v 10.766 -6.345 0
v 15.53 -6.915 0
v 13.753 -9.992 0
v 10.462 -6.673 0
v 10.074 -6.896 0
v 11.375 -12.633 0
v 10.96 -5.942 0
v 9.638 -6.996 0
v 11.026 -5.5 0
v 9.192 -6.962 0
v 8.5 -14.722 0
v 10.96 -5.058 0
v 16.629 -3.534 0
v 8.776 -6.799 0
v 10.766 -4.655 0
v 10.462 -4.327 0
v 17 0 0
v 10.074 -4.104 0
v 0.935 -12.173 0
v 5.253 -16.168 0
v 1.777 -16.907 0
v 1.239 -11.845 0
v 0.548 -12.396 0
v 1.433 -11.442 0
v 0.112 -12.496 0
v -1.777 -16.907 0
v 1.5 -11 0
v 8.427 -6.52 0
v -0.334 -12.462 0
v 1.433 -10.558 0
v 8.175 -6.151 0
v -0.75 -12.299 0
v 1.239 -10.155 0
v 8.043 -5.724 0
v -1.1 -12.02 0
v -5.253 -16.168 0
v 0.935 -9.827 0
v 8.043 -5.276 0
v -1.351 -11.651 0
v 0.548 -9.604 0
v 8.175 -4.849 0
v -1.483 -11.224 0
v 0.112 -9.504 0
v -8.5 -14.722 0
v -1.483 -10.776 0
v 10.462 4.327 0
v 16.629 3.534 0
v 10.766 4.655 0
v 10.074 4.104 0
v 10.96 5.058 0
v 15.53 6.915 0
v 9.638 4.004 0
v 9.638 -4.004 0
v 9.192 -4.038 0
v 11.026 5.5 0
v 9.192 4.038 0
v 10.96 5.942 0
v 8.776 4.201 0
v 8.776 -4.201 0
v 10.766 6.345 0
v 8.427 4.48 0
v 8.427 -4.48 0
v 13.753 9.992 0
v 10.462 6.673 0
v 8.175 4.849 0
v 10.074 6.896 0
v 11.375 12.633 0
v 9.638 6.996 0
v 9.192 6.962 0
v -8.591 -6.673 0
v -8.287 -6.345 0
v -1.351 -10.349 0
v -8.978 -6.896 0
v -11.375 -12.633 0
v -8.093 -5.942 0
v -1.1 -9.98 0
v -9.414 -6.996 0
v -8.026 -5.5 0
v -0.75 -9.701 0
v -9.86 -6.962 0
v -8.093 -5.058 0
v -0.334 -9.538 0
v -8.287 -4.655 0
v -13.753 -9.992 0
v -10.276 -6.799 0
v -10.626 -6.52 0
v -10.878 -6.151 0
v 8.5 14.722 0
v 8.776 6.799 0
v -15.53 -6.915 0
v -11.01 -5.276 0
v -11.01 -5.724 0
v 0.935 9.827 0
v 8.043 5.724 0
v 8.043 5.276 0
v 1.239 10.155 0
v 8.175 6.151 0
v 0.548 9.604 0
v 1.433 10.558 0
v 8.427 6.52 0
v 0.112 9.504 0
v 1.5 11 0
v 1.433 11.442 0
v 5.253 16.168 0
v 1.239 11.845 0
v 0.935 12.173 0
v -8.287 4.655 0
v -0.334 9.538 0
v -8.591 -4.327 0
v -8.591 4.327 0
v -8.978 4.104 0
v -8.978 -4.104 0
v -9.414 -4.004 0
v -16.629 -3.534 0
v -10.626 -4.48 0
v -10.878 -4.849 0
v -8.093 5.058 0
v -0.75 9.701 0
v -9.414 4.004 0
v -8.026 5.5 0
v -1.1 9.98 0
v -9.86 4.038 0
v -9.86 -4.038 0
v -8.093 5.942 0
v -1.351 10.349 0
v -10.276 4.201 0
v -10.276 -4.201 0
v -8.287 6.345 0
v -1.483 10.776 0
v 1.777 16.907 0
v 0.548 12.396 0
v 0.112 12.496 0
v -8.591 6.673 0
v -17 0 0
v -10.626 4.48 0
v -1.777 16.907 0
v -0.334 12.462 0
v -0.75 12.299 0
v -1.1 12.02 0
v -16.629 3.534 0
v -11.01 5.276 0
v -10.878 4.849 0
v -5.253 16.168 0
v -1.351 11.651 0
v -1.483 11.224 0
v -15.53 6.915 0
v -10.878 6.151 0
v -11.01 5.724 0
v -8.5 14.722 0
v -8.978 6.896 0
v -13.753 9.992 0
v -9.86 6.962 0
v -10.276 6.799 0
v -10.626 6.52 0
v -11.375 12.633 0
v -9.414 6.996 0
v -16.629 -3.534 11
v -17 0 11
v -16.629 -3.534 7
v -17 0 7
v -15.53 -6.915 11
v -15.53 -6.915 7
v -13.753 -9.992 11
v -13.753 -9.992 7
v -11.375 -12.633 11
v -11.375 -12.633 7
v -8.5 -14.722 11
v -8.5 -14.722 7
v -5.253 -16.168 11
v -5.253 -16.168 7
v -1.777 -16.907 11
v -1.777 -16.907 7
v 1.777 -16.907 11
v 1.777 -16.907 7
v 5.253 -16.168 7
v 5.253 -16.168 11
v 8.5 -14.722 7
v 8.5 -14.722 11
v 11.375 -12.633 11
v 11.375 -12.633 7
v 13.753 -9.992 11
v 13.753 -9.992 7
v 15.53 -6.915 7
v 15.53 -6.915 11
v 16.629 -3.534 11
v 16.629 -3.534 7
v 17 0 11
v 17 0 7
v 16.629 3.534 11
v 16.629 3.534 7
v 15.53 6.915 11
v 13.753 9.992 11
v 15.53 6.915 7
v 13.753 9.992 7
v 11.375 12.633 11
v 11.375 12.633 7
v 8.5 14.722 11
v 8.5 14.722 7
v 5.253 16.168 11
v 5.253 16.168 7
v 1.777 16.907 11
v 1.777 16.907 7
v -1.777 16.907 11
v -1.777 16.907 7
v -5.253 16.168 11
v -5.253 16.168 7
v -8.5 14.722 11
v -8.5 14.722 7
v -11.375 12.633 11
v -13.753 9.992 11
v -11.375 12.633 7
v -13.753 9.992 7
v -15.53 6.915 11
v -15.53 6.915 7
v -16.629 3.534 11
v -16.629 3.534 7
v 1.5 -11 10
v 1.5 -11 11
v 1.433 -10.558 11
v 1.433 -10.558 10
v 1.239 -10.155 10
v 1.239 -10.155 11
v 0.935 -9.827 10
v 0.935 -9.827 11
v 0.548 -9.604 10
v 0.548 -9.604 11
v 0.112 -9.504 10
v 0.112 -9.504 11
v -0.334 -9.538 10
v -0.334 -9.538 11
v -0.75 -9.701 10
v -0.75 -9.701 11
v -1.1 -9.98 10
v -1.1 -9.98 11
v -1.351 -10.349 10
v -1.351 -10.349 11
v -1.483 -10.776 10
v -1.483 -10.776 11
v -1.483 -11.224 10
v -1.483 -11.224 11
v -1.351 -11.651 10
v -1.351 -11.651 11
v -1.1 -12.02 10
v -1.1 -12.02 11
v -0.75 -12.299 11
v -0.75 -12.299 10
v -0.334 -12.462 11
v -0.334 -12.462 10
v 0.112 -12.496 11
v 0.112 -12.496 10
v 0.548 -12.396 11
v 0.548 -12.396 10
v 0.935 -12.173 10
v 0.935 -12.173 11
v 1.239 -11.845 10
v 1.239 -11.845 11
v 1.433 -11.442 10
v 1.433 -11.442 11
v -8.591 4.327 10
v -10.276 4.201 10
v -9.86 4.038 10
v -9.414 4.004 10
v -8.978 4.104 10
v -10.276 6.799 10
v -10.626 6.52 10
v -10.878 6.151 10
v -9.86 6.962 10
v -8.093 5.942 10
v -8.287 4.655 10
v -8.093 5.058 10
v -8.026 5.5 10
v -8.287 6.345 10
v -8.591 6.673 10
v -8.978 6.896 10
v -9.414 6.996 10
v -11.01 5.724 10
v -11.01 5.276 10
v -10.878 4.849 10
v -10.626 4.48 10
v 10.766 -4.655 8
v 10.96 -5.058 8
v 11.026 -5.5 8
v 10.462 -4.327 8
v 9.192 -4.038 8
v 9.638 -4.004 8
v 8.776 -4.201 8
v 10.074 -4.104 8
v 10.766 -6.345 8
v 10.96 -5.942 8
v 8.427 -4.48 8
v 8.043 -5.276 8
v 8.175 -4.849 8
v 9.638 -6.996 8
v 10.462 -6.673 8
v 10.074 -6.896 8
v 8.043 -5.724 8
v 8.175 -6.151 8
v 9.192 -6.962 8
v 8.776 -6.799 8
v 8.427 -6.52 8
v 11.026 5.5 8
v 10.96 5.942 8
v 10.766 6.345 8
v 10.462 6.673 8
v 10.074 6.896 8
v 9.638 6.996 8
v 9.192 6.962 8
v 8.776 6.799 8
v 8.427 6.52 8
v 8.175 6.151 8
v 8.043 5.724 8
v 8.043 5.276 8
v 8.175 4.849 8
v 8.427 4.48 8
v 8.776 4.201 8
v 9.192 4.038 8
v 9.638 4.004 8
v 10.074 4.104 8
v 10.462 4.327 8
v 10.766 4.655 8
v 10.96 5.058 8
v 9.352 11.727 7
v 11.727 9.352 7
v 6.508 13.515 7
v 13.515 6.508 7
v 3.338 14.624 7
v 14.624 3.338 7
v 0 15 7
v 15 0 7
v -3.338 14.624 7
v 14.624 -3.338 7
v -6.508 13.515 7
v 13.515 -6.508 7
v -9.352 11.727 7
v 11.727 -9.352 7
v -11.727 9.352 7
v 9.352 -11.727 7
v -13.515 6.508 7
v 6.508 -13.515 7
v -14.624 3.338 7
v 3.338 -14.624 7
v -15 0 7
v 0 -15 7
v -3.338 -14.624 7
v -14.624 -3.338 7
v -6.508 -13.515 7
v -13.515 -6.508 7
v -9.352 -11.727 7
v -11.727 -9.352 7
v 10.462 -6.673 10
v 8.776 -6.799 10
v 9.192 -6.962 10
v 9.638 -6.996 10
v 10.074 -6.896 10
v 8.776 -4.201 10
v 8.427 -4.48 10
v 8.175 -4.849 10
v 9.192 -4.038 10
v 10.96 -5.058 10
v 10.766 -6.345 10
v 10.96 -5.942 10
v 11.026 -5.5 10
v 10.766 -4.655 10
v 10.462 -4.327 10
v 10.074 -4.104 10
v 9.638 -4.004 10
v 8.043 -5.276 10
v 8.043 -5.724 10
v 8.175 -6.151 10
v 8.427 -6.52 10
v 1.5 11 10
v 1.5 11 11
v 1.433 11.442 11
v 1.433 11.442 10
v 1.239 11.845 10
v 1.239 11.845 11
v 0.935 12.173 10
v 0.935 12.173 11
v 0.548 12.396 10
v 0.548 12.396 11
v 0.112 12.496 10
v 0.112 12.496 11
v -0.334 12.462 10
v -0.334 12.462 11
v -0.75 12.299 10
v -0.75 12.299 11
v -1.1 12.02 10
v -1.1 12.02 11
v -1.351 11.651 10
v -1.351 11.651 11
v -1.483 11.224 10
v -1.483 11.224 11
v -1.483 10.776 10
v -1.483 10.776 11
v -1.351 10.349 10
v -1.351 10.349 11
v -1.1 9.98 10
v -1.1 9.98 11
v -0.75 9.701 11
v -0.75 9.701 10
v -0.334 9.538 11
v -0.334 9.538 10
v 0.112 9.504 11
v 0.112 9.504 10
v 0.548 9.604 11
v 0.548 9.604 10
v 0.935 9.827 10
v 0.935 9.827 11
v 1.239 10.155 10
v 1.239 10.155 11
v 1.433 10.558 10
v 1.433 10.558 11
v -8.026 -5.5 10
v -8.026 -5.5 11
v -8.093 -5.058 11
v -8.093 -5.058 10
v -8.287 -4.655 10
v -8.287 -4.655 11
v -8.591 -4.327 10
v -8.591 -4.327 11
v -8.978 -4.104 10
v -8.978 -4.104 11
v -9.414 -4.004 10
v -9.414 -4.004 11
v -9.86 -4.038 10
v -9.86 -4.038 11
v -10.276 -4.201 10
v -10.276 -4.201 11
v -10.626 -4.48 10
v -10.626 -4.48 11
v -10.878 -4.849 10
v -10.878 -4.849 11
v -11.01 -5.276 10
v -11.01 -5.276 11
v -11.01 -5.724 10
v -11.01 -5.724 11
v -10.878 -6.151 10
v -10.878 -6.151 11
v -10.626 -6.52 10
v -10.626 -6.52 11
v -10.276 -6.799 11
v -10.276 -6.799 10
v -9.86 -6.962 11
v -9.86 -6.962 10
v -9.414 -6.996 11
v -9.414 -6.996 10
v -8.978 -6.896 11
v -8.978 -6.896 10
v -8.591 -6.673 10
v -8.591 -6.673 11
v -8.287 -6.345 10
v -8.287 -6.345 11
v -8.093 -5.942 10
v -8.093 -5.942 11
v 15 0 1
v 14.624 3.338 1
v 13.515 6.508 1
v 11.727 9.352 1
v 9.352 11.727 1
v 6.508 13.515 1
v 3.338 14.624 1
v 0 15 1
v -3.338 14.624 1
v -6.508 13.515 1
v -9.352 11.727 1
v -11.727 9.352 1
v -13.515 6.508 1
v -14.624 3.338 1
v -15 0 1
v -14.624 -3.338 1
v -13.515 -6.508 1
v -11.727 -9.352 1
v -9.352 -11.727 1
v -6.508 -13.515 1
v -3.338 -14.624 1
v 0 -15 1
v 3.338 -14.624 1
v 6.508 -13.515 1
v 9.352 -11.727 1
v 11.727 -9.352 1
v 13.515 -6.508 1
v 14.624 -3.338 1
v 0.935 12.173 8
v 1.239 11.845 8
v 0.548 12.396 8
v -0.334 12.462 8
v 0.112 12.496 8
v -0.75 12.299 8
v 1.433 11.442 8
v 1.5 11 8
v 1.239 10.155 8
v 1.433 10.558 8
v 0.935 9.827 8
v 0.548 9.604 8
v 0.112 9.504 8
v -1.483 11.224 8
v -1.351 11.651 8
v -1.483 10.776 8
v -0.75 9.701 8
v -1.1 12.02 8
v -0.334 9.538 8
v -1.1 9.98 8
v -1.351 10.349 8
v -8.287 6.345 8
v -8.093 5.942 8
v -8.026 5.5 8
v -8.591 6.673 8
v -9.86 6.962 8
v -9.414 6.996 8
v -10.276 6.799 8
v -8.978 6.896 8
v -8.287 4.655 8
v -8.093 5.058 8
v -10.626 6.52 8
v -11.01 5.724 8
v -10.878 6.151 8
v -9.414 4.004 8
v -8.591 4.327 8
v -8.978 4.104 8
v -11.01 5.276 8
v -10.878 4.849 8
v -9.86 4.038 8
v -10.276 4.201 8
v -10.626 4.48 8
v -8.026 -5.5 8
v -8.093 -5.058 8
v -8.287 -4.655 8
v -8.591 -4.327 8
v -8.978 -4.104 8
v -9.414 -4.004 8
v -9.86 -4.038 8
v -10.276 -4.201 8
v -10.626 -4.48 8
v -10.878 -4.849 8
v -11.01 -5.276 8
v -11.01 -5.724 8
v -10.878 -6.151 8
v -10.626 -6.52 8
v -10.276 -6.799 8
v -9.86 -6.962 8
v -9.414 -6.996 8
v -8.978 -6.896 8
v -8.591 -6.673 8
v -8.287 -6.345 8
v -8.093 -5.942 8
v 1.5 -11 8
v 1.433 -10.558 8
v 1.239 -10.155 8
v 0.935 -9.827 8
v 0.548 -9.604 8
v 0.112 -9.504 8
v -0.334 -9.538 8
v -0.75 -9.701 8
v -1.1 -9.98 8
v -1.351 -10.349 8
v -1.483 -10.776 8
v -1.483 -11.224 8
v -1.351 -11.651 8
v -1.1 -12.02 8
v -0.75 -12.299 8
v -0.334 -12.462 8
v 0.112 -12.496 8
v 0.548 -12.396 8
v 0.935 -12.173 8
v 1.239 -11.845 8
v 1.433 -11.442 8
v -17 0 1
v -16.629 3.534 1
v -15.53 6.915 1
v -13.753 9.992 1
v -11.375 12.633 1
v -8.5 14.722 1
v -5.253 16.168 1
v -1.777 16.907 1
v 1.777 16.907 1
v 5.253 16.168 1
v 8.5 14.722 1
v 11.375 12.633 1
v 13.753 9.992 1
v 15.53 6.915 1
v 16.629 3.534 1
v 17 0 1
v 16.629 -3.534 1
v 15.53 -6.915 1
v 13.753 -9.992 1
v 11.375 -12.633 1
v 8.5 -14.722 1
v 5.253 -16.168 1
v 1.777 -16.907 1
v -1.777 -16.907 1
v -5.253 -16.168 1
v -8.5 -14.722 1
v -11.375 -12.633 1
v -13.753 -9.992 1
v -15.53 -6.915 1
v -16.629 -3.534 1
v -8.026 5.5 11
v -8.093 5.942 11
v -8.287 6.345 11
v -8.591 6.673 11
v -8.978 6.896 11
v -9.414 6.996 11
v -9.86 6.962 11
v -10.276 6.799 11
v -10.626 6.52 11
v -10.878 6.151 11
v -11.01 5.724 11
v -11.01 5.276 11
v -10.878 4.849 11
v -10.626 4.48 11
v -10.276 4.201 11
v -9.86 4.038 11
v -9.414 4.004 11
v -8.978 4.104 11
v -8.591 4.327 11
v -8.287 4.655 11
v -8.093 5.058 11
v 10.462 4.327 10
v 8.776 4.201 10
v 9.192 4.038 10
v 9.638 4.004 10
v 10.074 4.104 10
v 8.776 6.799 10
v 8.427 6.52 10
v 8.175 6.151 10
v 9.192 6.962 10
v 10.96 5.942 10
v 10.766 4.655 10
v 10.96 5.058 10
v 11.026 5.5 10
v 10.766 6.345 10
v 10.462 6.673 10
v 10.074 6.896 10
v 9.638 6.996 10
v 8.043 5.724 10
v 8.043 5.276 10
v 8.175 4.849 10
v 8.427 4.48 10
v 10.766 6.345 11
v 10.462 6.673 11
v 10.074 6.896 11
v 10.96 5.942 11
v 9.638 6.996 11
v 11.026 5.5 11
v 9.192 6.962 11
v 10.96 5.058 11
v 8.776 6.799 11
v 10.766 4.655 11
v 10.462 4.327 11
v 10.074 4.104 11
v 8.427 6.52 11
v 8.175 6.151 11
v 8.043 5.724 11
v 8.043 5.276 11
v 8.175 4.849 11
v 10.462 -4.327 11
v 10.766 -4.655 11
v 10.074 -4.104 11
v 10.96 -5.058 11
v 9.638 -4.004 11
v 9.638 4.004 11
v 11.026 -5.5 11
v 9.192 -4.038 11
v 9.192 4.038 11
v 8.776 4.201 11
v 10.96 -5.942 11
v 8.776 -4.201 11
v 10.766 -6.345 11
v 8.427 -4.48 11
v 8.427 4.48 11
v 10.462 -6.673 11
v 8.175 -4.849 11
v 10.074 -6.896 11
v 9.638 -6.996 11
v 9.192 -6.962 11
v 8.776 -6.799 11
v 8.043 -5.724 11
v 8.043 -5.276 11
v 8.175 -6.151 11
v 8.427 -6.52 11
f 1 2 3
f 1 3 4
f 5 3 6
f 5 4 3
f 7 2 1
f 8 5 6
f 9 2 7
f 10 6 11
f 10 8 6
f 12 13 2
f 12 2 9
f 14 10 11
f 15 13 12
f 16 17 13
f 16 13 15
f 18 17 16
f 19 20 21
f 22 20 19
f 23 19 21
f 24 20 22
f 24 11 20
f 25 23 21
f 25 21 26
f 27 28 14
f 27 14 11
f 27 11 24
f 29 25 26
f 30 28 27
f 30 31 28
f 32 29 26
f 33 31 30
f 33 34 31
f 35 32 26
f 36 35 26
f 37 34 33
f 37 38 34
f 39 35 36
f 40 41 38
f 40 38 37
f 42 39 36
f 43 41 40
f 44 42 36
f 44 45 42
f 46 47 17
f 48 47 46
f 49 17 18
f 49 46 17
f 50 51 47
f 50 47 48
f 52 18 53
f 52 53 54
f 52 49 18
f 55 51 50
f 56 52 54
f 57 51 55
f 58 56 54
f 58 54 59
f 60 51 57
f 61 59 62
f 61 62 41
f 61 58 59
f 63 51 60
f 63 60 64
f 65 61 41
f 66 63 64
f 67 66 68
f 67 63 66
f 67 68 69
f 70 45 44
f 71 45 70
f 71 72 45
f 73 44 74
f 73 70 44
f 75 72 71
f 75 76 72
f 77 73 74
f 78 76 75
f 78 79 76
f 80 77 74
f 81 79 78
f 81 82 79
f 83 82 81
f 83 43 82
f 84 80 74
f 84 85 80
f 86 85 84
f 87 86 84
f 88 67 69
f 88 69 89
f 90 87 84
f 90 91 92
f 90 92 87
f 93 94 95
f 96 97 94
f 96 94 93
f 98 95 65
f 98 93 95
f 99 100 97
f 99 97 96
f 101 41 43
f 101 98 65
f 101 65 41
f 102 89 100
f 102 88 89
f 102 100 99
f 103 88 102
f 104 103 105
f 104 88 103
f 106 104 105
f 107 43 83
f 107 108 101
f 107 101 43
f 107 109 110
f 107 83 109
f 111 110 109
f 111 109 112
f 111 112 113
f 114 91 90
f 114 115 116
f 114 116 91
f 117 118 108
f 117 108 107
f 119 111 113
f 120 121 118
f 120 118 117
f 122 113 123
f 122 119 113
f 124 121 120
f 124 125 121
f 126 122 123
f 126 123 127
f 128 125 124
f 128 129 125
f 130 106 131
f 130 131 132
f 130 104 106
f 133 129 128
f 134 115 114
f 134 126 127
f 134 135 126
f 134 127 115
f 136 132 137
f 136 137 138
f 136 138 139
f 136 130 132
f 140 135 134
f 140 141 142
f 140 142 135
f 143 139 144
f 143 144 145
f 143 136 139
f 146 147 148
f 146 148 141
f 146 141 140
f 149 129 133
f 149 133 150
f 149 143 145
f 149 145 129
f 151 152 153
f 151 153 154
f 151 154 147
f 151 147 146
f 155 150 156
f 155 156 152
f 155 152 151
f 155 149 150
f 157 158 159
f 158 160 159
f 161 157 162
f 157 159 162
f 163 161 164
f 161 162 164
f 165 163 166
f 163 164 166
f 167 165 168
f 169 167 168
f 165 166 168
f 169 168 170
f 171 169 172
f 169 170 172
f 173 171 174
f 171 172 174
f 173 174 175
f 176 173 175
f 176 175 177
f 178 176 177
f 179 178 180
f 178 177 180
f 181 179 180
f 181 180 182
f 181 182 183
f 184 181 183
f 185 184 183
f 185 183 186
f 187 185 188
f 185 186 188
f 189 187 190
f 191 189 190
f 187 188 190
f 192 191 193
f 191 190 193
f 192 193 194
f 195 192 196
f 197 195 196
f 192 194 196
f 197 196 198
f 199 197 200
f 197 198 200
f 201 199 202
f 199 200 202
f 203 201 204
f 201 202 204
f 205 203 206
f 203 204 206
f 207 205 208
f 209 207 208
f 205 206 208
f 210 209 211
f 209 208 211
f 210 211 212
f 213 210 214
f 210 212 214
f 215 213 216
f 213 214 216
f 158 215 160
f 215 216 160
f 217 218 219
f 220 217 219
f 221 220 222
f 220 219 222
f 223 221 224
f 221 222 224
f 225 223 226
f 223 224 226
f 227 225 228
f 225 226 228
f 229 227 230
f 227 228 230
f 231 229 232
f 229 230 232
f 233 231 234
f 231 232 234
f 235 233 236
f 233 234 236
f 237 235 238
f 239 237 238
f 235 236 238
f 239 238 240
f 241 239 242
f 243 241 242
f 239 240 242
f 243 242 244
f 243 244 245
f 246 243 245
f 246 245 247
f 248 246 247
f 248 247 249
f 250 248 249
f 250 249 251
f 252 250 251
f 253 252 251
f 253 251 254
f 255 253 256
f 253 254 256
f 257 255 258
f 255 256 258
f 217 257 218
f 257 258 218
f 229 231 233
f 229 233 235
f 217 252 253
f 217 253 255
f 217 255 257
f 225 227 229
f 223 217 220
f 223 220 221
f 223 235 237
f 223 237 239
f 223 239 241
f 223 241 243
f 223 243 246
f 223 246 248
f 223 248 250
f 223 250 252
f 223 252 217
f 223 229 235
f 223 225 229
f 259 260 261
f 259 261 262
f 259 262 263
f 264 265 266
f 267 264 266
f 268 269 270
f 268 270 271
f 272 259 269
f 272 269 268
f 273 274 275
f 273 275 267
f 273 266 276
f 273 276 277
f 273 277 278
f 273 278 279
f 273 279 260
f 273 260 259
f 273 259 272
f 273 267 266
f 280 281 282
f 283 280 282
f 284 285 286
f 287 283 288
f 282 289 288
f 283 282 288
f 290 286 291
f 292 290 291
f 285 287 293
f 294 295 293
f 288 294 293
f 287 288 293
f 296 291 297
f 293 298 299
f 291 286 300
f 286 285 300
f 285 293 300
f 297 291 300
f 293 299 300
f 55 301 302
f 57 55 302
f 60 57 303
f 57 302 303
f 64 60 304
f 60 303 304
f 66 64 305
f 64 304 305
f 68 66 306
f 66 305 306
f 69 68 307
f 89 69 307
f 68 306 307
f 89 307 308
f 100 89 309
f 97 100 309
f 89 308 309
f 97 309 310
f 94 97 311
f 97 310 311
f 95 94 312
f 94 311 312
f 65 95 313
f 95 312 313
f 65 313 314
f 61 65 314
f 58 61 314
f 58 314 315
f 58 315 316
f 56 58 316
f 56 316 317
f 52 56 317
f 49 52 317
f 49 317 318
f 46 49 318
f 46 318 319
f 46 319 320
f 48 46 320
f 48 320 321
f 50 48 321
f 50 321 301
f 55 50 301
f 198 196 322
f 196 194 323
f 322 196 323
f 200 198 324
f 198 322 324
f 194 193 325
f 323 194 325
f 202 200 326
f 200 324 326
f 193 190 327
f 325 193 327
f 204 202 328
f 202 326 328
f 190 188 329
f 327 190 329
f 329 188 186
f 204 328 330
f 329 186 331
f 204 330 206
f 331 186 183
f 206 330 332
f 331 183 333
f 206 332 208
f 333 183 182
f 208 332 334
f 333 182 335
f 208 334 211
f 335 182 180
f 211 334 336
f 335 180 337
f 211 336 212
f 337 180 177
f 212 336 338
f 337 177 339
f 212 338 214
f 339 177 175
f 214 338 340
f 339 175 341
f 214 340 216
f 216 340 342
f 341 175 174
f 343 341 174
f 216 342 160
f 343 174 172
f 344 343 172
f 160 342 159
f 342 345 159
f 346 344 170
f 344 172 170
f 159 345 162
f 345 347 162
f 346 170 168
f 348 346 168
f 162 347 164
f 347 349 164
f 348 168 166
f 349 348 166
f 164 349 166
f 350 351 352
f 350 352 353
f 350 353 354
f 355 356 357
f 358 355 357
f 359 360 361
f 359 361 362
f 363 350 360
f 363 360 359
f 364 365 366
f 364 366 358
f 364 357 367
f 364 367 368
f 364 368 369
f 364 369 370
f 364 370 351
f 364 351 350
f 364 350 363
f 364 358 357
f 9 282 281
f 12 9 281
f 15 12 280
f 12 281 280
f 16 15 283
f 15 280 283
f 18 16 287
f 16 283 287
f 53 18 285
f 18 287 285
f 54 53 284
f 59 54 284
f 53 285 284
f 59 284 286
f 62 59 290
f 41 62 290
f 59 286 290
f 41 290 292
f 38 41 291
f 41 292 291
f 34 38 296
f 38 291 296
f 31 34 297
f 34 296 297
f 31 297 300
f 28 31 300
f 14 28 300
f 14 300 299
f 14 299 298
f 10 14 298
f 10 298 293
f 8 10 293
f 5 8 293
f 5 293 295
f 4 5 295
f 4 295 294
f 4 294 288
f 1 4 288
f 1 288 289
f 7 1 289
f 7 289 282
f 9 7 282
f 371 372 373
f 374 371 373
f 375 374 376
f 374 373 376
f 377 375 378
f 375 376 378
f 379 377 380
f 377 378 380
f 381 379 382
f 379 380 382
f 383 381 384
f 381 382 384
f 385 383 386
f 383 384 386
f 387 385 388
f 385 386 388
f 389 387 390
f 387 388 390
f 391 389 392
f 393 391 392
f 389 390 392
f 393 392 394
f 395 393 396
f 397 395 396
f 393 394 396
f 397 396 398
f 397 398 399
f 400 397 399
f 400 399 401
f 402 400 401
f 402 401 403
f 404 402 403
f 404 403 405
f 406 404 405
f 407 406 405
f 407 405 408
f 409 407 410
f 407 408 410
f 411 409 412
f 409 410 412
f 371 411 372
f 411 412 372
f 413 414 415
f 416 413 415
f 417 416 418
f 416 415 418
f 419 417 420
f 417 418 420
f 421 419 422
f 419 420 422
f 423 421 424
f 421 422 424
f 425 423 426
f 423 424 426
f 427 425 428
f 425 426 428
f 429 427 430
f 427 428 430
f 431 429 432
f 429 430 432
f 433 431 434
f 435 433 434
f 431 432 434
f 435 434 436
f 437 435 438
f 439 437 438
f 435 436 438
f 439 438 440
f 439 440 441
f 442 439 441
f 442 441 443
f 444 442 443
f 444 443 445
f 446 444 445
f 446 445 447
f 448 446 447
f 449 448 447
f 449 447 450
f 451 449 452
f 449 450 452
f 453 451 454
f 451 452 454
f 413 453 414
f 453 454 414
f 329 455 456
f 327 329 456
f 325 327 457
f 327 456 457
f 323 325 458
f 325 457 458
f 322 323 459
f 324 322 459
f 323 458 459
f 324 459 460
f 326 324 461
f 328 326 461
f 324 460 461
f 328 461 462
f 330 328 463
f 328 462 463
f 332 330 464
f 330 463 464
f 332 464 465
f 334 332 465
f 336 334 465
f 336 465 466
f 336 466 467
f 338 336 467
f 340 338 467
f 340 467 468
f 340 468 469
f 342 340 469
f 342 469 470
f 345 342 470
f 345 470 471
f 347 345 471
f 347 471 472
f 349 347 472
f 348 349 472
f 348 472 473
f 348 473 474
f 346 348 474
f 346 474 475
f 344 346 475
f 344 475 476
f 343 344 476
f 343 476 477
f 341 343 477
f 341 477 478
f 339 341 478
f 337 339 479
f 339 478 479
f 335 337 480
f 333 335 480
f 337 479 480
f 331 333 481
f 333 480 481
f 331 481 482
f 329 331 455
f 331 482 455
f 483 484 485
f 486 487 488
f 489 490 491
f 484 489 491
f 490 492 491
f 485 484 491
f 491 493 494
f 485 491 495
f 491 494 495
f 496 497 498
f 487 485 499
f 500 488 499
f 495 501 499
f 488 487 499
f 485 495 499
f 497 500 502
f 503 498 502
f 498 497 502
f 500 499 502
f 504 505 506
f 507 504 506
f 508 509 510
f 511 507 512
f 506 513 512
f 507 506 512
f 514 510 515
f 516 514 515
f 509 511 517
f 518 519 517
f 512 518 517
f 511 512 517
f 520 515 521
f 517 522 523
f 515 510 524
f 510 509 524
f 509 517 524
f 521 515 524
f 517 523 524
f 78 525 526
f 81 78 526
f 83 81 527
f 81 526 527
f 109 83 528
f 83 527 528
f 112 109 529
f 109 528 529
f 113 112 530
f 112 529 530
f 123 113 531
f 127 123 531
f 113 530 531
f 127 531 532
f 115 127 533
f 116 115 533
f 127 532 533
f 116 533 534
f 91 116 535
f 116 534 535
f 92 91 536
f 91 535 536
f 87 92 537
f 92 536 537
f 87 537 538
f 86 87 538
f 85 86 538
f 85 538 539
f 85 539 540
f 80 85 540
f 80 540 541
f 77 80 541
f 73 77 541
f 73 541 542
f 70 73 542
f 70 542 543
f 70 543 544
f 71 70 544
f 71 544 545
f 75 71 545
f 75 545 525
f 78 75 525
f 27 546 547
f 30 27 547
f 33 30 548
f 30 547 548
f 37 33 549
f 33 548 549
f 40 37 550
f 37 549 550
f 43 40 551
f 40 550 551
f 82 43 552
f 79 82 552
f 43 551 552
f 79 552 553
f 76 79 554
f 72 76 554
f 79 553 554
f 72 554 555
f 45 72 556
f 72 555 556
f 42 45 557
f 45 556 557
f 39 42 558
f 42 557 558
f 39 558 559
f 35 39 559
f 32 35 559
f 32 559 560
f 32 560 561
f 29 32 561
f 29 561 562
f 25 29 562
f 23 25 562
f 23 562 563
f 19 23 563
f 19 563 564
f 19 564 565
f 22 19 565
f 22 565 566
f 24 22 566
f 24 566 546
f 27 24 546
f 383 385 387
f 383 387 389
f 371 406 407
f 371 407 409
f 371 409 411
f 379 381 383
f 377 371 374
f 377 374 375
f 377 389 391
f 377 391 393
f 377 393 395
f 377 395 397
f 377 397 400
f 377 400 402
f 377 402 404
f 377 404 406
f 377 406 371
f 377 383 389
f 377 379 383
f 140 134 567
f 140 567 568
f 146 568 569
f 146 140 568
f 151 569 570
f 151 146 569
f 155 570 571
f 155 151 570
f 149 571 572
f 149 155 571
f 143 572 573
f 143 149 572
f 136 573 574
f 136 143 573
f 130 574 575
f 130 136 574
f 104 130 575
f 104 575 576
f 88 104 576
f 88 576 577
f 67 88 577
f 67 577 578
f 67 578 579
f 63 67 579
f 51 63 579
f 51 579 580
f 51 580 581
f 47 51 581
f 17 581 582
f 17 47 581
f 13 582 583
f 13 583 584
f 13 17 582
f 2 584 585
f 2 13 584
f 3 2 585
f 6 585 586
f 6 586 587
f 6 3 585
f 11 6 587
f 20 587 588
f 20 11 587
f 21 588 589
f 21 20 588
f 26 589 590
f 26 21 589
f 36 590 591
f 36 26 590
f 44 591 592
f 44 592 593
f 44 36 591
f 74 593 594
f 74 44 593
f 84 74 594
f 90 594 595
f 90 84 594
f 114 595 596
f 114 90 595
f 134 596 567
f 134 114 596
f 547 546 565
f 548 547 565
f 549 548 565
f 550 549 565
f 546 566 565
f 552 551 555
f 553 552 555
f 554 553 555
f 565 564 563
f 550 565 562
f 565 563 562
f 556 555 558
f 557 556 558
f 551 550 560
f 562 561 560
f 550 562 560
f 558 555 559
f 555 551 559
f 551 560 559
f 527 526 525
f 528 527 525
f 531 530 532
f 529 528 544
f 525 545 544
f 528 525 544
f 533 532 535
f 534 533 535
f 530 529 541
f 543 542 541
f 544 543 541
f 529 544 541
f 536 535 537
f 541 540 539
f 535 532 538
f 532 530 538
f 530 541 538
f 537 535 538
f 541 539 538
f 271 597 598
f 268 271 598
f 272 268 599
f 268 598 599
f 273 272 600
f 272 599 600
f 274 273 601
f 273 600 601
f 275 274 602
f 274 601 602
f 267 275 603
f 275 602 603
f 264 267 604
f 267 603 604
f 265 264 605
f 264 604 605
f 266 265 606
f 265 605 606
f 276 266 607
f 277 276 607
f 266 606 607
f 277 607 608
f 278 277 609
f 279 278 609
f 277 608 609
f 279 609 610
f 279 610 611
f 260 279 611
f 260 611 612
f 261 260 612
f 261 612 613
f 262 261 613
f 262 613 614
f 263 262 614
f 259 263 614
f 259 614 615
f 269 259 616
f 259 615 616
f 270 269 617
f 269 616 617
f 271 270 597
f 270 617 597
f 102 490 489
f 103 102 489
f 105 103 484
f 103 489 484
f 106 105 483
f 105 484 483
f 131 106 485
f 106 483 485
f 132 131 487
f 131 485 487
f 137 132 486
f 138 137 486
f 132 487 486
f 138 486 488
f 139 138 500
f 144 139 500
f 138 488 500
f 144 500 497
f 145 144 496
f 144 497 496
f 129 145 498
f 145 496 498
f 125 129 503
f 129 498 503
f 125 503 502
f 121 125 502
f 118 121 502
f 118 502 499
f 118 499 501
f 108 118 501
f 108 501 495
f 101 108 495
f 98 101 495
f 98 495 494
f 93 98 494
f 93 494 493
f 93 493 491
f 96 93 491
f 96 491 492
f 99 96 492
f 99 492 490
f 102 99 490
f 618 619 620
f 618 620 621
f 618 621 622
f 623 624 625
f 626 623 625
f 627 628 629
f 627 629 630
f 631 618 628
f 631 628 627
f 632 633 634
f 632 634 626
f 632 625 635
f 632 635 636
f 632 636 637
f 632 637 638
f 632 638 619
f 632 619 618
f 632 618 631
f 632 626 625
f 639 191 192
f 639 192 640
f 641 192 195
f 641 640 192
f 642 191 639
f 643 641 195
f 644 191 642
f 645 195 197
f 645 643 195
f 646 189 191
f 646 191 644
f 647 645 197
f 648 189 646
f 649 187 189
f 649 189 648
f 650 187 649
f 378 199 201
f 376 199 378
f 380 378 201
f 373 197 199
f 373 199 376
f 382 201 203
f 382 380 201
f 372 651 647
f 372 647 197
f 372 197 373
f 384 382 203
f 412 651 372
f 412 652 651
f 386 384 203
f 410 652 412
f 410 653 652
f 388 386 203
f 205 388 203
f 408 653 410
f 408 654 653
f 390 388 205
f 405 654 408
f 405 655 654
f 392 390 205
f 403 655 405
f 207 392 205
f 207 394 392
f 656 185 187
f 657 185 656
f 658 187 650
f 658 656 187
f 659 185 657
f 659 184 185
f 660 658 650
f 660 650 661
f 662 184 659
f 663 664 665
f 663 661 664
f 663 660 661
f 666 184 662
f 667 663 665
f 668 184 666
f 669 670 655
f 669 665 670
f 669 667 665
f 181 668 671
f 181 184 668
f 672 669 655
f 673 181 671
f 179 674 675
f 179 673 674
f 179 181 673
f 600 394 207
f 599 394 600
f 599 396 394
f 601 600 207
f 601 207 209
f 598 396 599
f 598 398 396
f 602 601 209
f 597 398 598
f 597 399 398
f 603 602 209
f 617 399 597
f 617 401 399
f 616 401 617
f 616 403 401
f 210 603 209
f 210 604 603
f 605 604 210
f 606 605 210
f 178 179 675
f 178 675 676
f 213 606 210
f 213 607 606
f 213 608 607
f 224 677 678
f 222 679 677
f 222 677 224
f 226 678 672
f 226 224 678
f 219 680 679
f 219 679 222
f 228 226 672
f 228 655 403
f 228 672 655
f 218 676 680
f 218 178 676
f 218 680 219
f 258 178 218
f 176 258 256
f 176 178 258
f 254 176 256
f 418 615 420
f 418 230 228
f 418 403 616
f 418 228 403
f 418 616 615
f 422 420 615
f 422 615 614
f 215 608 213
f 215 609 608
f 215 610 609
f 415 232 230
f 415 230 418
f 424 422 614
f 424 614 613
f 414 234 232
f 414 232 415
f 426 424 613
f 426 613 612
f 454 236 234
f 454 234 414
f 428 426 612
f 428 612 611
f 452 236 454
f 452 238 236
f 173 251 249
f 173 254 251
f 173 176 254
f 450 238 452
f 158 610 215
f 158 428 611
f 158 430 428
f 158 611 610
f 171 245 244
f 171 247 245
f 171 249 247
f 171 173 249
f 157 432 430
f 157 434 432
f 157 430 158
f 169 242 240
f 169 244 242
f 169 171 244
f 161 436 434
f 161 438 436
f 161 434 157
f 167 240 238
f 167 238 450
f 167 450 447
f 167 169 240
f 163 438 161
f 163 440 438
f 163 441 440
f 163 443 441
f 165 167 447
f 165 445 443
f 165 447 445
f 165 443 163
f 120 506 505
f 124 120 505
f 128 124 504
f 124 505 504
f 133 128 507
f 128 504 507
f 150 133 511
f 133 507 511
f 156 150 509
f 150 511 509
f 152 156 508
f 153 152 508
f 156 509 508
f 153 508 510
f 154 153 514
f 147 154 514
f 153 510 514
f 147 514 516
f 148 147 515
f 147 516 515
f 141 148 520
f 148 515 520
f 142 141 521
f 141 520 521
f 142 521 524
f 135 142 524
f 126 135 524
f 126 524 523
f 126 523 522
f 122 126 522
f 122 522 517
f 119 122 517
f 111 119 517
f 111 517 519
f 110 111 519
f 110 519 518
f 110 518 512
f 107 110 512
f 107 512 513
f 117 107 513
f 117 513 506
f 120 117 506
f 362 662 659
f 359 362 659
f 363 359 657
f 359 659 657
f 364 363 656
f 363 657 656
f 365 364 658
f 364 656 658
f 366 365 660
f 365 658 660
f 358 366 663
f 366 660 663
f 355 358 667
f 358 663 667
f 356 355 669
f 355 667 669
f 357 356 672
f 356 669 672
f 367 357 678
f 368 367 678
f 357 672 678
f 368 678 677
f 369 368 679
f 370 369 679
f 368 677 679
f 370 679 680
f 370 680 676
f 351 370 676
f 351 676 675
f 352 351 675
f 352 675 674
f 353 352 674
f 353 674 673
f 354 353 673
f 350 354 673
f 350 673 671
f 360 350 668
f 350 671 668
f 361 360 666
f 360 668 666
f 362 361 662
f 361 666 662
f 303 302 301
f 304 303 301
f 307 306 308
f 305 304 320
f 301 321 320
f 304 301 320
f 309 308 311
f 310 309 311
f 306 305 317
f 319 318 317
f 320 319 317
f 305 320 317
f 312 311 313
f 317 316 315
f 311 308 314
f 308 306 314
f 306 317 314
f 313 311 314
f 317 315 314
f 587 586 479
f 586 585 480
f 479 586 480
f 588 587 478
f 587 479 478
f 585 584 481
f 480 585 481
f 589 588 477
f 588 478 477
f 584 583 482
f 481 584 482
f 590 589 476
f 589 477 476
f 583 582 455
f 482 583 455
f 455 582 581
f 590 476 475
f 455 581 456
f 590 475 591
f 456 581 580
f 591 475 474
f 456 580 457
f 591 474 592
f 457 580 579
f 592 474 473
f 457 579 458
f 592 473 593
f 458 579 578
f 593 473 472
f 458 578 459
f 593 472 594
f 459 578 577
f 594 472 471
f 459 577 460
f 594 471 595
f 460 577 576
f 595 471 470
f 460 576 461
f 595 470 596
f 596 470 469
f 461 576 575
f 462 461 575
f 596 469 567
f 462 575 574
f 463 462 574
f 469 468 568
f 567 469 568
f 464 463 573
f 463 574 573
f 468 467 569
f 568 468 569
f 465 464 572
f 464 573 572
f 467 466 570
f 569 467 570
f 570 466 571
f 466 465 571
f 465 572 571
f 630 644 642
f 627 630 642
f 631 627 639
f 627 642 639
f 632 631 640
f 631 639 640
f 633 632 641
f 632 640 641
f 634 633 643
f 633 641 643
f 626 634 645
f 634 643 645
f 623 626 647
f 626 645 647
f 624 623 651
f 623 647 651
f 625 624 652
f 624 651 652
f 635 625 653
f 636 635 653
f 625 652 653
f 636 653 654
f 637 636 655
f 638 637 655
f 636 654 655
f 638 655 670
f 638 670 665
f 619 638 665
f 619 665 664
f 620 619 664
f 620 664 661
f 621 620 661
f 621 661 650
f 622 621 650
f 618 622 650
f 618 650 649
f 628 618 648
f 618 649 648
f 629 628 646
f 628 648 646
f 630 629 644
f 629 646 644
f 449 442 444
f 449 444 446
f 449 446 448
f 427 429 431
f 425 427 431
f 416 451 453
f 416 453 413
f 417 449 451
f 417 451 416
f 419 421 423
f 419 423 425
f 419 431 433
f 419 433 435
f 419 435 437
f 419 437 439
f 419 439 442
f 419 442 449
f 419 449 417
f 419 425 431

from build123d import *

# Parameters (mm, degrees)
SKETCH_1_R          = 15
EXTRUDE_1_DEPTH     = 8
SKETCH_2_R          = 17
SKETCH_2_R_2        = 15
EXTRUDE_2_DEPTH     = 1
SKETCH_3_R          = 1.5
CUT_EXTRUDE_1_DEPTH = 26.337718919
EXTRUDE_START       = -1
SKETCH_4_R          = 17
SKETCH_4_R_2        = 15
EXTRUDE_3_DEPTH     = 1
SKETCH_5_R          = 17
EXTRUDE_4_DEPTH     = 3
SKETCH_6_R          = 1.5
CUT_EXTRUDE_6_DEPTH = 1


with BuildPart() as part:
    # 草图1 → 凸台-拉伸1 (new body)
    with BuildSketch(Plane.XY):
        Circle(SKETCH_1_R)
    extrude(amount=EXTRUDE_1_DEPTH)

    # 草图2 → 凸台-拉伸2 (add)
    with BuildSketch(Plane(origin=(0, 0, 0), x_dir=(-1, 0, 0), z_dir=(0, 0, -1))):
        Circle(SKETCH_2_R)
        Circle(SKETCH_2_R_2, mode=Mode.SUBTRACT)
    extrude(amount=-EXTRUDE_2_DEPTH)

    # 草图3 → 切除-拉伸1 (cut, through all)
    with BuildSketch(Plane.XY.offset(8)):
        with Locations((0, 11)):
            Circle(SKETCH_3_R)
        with Locations((9.526279442, 5.5)):
            Circle(SKETCH_3_R)
        with Locations((9.526279442, -5.5)):
            Circle(SKETCH_3_R)
        with Locations((0, -11)):
            Circle(SKETCH_3_R)
        with Locations((-9.526279442, -5.5)):
            Circle(SKETCH_3_R)
        with Locations((-9.526279442, 5.5)):
            Circle(SKETCH_3_R)
    extrude(amount=-CUT_EXTRUDE_1_DEPTH, mode=Mode.SUBTRACT)

    # 草图4 → 凸台-拉伸3 (add)
    with BuildSketch(Plane.XY.offset(8).offset(EXTRUDE_START)):
        with Locations(Location((0, 0, 0), (0, 0, 180))):
            Circle(SKETCH_4_R)
        with Locations(Location((0, 0, 0), (0, 0, 180))):
            Circle(SKETCH_4_R_2, mode=Mode.SUBTRACT)
    extrude(amount=EXTRUDE_3_DEPTH)

    # 草图5 → 凸台-拉伸4 (add)
    with BuildSketch(Plane.XY.offset(8)):
        with Locations(Location((0, 0, 0), (0, 0, 180))):
            Circle(SKETCH_5_R)
    extrude(amount=EXTRUDE_4_DEPTH)

    # 草图6 → 切除-拉伸6 (cut)
    with BuildSketch(Plane.XY.offset(11)):
        with Locations((0, 11)):
            Circle(SKETCH_6_R)
        with Locations((9.526279442, 5.5)):
            Circle(SKETCH_6_R)
        with Locations((9.526279442, -5.5)):
            Circle(SKETCH_6_R)
        with Locations((0, -11)):
            Circle(SKETCH_6_R)
        with Locations((-9.526279442, -5.5)):
            Circle(SKETCH_6_R)
        with Locations((-9.526279442, 5.5)):
            Circle(SKETCH_6_R)
    extrude(amount=-CUT_EXTRUDE_6_DEPTH, mode=Mode.SUBTRACT)


solid = part.part
